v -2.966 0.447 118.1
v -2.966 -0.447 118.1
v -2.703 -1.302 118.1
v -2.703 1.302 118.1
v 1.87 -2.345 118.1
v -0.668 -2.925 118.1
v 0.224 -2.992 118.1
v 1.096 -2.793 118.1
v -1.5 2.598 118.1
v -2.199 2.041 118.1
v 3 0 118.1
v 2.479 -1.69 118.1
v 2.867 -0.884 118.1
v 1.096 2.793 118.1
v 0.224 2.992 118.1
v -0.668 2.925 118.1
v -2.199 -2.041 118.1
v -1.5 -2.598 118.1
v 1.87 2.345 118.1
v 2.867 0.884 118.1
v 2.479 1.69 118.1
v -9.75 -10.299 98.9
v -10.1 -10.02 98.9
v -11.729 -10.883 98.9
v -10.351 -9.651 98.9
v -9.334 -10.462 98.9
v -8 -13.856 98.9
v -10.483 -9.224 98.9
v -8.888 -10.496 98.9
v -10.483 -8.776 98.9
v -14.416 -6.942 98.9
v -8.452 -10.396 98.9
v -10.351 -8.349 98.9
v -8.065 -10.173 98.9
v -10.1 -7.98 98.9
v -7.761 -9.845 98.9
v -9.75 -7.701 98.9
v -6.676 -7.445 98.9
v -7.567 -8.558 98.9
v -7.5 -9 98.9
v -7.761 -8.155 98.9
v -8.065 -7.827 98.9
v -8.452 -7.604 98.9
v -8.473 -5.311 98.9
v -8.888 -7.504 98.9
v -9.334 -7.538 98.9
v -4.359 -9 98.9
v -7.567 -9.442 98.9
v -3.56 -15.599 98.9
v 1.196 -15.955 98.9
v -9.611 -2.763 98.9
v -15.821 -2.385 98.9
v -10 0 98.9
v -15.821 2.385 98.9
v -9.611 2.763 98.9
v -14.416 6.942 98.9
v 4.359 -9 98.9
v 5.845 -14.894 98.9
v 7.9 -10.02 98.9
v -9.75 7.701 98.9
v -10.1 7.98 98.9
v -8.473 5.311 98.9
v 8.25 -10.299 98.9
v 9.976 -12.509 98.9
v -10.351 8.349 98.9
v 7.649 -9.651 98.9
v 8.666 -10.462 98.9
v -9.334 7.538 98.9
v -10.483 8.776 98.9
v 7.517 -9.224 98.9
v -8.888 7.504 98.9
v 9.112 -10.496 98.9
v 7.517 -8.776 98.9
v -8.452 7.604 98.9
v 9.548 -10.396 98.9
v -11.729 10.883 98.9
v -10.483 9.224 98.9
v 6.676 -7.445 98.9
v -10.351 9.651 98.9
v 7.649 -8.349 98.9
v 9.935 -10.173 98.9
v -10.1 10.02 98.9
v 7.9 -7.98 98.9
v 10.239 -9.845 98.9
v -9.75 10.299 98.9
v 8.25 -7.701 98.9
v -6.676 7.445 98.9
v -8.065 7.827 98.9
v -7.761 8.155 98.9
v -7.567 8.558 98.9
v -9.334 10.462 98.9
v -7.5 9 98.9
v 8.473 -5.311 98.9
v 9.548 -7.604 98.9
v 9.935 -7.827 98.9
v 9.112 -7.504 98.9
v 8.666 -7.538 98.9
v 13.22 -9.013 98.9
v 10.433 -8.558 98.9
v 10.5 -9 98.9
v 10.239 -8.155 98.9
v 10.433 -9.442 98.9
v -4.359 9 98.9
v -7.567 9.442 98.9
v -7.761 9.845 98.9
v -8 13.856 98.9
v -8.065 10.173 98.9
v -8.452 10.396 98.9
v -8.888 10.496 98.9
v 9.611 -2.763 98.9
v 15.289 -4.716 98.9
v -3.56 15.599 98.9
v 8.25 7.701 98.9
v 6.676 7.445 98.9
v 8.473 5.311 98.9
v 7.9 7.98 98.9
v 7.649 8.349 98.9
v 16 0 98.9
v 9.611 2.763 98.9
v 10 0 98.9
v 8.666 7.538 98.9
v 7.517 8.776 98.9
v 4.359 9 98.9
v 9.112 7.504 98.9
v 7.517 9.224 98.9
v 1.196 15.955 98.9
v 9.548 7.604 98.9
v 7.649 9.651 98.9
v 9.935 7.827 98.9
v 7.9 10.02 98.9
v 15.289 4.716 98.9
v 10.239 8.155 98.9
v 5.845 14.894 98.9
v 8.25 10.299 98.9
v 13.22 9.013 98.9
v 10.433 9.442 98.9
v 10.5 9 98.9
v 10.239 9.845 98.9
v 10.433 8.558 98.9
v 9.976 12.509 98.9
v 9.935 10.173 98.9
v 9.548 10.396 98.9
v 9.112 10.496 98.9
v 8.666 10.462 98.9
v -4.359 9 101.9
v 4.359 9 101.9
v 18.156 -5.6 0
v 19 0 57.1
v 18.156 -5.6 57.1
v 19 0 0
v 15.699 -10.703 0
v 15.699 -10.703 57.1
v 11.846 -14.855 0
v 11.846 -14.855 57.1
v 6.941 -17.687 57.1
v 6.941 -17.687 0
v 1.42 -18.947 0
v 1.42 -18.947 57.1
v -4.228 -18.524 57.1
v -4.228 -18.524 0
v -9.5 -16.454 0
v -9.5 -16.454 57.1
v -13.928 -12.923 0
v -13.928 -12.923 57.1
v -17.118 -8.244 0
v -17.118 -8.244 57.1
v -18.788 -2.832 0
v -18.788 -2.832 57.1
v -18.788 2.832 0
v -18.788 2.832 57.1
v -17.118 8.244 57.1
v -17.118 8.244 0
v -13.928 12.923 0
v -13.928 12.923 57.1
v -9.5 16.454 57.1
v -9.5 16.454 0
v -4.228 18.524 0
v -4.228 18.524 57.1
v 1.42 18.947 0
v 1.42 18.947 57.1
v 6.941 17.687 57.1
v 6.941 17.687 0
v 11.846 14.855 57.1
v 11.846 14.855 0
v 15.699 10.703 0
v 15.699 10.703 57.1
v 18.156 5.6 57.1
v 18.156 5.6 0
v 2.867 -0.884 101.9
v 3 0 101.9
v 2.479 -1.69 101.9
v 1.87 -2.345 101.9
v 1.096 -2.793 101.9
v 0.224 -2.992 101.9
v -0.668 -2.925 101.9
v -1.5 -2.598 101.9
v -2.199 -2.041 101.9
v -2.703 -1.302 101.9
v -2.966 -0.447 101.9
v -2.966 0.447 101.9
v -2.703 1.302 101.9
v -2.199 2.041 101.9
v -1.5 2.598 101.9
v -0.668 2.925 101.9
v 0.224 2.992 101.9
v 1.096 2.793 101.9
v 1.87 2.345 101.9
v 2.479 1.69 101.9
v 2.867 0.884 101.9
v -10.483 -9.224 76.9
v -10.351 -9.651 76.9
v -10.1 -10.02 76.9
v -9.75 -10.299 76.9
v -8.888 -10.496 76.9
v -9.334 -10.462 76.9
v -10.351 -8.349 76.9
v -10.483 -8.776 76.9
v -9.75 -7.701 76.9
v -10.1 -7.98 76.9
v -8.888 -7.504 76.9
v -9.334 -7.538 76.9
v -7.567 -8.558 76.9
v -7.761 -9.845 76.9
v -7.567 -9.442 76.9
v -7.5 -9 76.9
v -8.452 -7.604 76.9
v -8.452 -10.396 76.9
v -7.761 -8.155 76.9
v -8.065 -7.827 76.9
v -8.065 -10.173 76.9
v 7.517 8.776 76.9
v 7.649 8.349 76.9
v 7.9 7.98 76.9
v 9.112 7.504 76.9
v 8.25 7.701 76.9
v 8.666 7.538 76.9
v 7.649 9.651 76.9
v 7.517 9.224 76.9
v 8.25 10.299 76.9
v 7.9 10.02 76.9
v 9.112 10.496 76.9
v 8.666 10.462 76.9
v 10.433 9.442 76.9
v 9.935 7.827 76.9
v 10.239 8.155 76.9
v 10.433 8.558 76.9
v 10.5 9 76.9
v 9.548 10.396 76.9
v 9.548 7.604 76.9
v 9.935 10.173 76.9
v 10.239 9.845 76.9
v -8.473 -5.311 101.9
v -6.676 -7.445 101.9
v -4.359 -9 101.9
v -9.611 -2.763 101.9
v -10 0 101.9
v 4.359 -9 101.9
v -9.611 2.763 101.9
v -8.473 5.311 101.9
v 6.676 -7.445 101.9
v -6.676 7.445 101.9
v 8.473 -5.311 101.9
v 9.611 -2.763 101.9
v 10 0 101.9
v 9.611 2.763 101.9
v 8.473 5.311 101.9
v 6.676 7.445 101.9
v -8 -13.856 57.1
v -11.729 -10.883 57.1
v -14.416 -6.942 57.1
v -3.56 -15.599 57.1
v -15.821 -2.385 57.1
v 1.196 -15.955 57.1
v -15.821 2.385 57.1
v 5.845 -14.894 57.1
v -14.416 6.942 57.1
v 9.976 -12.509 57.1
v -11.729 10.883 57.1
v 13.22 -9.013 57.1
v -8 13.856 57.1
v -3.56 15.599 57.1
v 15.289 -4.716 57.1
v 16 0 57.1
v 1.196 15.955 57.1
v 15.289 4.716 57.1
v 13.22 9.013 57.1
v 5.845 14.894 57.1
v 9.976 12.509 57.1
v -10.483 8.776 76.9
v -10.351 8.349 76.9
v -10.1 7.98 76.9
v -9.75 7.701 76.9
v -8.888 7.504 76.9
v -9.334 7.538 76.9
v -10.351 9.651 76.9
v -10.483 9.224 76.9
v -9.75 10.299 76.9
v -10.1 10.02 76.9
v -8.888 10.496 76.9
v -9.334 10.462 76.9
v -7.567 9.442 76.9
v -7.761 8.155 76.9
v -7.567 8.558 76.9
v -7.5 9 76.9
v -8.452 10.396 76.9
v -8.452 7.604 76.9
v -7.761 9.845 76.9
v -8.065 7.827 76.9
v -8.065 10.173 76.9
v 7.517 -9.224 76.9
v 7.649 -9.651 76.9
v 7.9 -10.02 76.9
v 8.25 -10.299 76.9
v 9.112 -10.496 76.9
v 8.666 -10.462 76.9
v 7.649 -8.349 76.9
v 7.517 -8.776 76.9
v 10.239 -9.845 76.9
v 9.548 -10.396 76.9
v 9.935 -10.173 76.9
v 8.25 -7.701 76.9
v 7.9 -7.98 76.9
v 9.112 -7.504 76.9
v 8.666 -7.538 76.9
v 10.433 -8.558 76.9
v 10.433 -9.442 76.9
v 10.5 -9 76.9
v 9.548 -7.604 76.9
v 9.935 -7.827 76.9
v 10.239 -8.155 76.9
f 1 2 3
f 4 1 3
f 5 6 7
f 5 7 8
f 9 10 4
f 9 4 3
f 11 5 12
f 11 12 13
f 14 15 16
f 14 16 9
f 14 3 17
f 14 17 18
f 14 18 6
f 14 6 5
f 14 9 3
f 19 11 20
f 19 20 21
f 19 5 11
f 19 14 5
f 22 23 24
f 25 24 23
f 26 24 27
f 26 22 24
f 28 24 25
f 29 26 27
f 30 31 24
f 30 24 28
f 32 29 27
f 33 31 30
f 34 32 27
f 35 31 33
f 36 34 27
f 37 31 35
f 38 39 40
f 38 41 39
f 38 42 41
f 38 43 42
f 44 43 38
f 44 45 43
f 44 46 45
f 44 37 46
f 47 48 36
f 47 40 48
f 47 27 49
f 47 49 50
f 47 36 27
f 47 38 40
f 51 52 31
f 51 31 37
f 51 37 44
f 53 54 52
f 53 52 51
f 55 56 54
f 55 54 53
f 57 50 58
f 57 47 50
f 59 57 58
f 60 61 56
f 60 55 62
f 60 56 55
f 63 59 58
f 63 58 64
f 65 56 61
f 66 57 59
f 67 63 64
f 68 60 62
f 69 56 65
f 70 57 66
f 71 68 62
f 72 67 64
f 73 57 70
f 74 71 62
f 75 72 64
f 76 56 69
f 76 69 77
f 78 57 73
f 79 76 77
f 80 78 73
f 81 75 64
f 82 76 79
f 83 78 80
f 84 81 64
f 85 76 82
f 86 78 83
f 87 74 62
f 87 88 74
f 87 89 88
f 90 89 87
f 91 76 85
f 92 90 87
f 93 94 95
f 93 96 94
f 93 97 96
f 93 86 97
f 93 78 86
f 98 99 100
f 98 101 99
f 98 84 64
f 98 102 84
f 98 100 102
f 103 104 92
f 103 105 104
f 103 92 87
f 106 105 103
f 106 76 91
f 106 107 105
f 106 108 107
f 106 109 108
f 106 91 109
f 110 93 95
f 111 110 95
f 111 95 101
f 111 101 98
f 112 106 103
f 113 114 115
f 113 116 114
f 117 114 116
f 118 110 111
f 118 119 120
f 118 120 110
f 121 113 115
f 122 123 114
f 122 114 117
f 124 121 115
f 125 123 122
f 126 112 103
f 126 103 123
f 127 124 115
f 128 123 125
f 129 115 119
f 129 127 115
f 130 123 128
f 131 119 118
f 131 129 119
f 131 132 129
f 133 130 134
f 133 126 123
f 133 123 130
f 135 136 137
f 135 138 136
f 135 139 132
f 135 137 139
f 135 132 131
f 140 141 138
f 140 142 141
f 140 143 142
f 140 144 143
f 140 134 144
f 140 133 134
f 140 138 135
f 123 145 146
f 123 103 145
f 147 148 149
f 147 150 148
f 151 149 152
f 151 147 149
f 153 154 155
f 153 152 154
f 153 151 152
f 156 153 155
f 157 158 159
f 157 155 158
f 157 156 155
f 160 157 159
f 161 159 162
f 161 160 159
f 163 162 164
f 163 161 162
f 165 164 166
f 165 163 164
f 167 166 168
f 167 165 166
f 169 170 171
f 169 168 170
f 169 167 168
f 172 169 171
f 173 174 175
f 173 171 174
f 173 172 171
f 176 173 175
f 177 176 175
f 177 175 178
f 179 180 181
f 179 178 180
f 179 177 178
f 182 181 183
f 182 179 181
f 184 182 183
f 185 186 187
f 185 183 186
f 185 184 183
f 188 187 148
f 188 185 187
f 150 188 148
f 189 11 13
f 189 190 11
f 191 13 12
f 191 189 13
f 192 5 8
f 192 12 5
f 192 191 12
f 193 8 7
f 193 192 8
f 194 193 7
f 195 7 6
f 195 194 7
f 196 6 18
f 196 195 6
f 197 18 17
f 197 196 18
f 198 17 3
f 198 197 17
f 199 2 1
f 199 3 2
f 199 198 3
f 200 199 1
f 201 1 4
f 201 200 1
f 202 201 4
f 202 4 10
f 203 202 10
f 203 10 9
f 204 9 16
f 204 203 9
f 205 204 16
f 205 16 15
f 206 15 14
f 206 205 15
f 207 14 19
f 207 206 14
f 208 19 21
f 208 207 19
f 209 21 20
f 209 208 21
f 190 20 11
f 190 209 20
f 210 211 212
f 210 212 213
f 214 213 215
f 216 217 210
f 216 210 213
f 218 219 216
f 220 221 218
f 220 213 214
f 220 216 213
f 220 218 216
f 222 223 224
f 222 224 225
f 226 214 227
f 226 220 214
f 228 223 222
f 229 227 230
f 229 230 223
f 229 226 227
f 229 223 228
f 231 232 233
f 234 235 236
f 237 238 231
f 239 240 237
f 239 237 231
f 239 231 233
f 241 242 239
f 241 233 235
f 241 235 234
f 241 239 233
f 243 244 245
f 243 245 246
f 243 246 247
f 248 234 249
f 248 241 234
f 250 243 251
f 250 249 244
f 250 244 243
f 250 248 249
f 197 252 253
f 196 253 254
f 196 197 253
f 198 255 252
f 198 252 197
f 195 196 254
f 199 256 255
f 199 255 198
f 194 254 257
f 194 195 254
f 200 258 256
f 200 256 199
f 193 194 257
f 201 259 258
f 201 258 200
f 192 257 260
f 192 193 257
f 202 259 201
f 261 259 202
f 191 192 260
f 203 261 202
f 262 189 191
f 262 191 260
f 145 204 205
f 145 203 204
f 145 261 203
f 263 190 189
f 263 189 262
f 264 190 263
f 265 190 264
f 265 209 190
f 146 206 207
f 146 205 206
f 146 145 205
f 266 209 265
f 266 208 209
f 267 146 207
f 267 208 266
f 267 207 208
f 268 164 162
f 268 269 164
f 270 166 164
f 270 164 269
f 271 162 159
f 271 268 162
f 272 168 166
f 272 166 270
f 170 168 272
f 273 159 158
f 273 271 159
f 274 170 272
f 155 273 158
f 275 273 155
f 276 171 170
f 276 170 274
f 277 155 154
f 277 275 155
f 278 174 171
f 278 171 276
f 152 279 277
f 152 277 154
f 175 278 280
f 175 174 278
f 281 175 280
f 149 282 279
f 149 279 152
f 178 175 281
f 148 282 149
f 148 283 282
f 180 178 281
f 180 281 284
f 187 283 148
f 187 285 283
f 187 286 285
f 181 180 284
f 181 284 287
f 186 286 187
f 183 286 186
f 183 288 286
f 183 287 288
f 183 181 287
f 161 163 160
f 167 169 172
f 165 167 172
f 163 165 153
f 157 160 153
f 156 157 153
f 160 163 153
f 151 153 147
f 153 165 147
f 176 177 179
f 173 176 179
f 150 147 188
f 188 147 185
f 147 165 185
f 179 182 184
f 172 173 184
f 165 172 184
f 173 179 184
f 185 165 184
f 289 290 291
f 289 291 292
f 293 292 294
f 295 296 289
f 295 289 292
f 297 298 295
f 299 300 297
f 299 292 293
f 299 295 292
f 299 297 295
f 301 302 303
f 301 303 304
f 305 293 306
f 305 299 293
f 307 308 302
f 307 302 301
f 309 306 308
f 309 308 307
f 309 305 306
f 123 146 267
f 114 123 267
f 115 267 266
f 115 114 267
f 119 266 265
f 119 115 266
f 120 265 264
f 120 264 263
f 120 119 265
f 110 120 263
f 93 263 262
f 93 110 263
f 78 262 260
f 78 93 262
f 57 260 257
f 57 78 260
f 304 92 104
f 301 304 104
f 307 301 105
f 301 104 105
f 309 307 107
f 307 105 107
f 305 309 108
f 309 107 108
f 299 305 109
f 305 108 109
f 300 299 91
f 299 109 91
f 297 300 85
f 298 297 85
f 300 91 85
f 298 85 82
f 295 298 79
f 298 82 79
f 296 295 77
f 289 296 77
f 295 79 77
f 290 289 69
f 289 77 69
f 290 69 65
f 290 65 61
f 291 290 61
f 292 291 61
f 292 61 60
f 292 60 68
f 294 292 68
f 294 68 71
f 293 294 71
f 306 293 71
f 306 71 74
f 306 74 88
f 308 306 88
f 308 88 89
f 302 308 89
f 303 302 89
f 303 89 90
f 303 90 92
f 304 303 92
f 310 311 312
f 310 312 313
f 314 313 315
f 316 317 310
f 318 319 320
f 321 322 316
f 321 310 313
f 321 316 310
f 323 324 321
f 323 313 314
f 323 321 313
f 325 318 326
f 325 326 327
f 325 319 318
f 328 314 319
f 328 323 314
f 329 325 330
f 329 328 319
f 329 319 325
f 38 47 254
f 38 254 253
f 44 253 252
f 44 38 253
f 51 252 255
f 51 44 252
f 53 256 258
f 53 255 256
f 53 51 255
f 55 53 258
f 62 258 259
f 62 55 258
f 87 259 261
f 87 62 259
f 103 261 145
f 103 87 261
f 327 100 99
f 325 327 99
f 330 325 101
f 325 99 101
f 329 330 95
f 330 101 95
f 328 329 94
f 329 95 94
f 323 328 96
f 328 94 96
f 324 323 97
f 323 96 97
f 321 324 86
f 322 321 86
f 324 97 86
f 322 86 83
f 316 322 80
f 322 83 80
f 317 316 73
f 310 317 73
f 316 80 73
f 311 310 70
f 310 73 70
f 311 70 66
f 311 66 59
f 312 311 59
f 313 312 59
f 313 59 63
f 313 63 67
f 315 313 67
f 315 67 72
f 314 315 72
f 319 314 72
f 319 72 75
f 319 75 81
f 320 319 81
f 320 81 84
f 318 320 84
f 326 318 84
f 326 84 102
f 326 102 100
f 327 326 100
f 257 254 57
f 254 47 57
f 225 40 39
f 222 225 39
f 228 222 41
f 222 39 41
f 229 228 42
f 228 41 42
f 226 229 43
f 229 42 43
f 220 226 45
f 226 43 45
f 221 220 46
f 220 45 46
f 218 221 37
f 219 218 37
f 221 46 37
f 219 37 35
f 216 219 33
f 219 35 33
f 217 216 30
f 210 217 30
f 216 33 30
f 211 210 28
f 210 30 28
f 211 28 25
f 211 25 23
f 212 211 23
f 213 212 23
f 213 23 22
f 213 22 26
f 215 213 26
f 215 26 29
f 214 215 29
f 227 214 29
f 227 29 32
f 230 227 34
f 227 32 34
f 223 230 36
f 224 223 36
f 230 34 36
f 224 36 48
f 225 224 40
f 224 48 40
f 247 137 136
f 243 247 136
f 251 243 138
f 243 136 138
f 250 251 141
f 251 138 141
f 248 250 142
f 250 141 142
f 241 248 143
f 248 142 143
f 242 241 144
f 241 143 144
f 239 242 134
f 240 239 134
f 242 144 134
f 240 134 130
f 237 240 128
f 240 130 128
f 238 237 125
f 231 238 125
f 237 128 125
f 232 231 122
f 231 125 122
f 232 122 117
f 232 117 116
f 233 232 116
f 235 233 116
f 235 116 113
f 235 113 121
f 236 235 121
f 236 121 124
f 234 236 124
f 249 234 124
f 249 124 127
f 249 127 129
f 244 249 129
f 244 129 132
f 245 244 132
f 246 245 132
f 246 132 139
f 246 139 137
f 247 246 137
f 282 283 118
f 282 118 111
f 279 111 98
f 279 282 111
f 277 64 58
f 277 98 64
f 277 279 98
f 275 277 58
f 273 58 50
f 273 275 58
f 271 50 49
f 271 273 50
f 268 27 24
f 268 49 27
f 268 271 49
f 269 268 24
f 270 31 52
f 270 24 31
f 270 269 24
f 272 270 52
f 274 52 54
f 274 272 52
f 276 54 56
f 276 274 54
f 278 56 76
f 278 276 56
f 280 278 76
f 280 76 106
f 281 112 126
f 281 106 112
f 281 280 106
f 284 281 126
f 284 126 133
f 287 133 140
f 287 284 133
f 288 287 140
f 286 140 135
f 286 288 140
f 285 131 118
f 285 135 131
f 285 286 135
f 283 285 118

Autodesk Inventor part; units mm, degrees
ref_plane "YZ Plane" through (0, 0, 0) normal (1, 0, 0) x (0, 1, 0)
ref_plane "XZ Plane" through (0, 0, 0) normal (0, 1, 0) x (-1, 0, 0)
ref_plane "XY Plane" through (0, 0, 0) normal (0, 0, 1) x (1, 0, 0)
sketch "Sketch1" plane through (0, 0, 0) normal (0, 0, 1) x (1, 0, 0)
  circle A0 centre (0, 0) radius 19
  dimension "d0" = 38
extrude "Extrusion1" add sketch "Sketch1" along normal blind 57.1
sketch "Sketch2" plane through (0, 0, 57.1) normal (0, 0, 1) x (1, 0, 0)
  circle A0 centre (0, 0) radius 16
  dimension "d3" = 32
extrude "Extrusion2" add sketch "Sketch2" along normal blind 41.8
sketch "Sketch3" plane through (0, 0, 98.9) normal (0, 0, 1) x (1, 0, 0)
  circle A0 centre (0, 0) radius 10
  dimension "d6" = 20
extrude "Extrusion3" add sketch "Sketch3" along normal blind 3
sketch "Sketch4" plane through (0, 0, 101.9) normal (0, 0, 1) x (1, 0, 0)
  circle A0 centre (0, 0) radius 3
  dimension "d9" = 6
extrude "Extrusion4" add sketch "Sketch4" along normal blind 16.2
sketch "Sketch5" plane through (0, 0, 101.9) normal (0, 0, 1) x (1, 0, 0)
  line L0 (-9, -9) -> (9, -9) construction
  line L1 (9, -9) -> (9, 9) construction
  line L2 (9, 9) -> (-9, 9) construction
  line L3 (-9, 9) -> (-9, -9) construction
  line L4 (-9, -9) -> (9, 9) construction
  line L5 (9, -9) -> (-9, 9) construction
  circle A0 centre (9, 9) radius 1.5
  circle A1 centre (9, -9) radius 1.5
  circle A2 centre (-9, -9) radius 1.5
  circle A3 centre (-9, 9) radius 1.5
  point P0 (0, 0)
  dimension "d12" = 18
  dimension "d13" = 18
  dimension "d14" = 3
  dimension "d15" = 3
  dimension "d16" = 3
  dimension "d17" = 3
extrude "Extrusion5" cut sketch "Sketch5" against normal blind 25
sketch "Sketch6" plane through (0, 0, 98.9) normal (0, 0, 1) x (1, 0, 0)
  circle A0 centre (0, 0) radius 3 projected
  circle A1 centre (0, 0) radius 10 projected
  line L0 (-4.3589, -9) -> (4.3589, -9)
  line L1 (-4.3589, 9) -> (4.3589, 9)
  dimension "d20" = 18
extrude "Extrusion6" cut sketch "Sketch6" along normal through all contours L1 A1 | A1 L0
properties part number "12RPM Gear Motor"
